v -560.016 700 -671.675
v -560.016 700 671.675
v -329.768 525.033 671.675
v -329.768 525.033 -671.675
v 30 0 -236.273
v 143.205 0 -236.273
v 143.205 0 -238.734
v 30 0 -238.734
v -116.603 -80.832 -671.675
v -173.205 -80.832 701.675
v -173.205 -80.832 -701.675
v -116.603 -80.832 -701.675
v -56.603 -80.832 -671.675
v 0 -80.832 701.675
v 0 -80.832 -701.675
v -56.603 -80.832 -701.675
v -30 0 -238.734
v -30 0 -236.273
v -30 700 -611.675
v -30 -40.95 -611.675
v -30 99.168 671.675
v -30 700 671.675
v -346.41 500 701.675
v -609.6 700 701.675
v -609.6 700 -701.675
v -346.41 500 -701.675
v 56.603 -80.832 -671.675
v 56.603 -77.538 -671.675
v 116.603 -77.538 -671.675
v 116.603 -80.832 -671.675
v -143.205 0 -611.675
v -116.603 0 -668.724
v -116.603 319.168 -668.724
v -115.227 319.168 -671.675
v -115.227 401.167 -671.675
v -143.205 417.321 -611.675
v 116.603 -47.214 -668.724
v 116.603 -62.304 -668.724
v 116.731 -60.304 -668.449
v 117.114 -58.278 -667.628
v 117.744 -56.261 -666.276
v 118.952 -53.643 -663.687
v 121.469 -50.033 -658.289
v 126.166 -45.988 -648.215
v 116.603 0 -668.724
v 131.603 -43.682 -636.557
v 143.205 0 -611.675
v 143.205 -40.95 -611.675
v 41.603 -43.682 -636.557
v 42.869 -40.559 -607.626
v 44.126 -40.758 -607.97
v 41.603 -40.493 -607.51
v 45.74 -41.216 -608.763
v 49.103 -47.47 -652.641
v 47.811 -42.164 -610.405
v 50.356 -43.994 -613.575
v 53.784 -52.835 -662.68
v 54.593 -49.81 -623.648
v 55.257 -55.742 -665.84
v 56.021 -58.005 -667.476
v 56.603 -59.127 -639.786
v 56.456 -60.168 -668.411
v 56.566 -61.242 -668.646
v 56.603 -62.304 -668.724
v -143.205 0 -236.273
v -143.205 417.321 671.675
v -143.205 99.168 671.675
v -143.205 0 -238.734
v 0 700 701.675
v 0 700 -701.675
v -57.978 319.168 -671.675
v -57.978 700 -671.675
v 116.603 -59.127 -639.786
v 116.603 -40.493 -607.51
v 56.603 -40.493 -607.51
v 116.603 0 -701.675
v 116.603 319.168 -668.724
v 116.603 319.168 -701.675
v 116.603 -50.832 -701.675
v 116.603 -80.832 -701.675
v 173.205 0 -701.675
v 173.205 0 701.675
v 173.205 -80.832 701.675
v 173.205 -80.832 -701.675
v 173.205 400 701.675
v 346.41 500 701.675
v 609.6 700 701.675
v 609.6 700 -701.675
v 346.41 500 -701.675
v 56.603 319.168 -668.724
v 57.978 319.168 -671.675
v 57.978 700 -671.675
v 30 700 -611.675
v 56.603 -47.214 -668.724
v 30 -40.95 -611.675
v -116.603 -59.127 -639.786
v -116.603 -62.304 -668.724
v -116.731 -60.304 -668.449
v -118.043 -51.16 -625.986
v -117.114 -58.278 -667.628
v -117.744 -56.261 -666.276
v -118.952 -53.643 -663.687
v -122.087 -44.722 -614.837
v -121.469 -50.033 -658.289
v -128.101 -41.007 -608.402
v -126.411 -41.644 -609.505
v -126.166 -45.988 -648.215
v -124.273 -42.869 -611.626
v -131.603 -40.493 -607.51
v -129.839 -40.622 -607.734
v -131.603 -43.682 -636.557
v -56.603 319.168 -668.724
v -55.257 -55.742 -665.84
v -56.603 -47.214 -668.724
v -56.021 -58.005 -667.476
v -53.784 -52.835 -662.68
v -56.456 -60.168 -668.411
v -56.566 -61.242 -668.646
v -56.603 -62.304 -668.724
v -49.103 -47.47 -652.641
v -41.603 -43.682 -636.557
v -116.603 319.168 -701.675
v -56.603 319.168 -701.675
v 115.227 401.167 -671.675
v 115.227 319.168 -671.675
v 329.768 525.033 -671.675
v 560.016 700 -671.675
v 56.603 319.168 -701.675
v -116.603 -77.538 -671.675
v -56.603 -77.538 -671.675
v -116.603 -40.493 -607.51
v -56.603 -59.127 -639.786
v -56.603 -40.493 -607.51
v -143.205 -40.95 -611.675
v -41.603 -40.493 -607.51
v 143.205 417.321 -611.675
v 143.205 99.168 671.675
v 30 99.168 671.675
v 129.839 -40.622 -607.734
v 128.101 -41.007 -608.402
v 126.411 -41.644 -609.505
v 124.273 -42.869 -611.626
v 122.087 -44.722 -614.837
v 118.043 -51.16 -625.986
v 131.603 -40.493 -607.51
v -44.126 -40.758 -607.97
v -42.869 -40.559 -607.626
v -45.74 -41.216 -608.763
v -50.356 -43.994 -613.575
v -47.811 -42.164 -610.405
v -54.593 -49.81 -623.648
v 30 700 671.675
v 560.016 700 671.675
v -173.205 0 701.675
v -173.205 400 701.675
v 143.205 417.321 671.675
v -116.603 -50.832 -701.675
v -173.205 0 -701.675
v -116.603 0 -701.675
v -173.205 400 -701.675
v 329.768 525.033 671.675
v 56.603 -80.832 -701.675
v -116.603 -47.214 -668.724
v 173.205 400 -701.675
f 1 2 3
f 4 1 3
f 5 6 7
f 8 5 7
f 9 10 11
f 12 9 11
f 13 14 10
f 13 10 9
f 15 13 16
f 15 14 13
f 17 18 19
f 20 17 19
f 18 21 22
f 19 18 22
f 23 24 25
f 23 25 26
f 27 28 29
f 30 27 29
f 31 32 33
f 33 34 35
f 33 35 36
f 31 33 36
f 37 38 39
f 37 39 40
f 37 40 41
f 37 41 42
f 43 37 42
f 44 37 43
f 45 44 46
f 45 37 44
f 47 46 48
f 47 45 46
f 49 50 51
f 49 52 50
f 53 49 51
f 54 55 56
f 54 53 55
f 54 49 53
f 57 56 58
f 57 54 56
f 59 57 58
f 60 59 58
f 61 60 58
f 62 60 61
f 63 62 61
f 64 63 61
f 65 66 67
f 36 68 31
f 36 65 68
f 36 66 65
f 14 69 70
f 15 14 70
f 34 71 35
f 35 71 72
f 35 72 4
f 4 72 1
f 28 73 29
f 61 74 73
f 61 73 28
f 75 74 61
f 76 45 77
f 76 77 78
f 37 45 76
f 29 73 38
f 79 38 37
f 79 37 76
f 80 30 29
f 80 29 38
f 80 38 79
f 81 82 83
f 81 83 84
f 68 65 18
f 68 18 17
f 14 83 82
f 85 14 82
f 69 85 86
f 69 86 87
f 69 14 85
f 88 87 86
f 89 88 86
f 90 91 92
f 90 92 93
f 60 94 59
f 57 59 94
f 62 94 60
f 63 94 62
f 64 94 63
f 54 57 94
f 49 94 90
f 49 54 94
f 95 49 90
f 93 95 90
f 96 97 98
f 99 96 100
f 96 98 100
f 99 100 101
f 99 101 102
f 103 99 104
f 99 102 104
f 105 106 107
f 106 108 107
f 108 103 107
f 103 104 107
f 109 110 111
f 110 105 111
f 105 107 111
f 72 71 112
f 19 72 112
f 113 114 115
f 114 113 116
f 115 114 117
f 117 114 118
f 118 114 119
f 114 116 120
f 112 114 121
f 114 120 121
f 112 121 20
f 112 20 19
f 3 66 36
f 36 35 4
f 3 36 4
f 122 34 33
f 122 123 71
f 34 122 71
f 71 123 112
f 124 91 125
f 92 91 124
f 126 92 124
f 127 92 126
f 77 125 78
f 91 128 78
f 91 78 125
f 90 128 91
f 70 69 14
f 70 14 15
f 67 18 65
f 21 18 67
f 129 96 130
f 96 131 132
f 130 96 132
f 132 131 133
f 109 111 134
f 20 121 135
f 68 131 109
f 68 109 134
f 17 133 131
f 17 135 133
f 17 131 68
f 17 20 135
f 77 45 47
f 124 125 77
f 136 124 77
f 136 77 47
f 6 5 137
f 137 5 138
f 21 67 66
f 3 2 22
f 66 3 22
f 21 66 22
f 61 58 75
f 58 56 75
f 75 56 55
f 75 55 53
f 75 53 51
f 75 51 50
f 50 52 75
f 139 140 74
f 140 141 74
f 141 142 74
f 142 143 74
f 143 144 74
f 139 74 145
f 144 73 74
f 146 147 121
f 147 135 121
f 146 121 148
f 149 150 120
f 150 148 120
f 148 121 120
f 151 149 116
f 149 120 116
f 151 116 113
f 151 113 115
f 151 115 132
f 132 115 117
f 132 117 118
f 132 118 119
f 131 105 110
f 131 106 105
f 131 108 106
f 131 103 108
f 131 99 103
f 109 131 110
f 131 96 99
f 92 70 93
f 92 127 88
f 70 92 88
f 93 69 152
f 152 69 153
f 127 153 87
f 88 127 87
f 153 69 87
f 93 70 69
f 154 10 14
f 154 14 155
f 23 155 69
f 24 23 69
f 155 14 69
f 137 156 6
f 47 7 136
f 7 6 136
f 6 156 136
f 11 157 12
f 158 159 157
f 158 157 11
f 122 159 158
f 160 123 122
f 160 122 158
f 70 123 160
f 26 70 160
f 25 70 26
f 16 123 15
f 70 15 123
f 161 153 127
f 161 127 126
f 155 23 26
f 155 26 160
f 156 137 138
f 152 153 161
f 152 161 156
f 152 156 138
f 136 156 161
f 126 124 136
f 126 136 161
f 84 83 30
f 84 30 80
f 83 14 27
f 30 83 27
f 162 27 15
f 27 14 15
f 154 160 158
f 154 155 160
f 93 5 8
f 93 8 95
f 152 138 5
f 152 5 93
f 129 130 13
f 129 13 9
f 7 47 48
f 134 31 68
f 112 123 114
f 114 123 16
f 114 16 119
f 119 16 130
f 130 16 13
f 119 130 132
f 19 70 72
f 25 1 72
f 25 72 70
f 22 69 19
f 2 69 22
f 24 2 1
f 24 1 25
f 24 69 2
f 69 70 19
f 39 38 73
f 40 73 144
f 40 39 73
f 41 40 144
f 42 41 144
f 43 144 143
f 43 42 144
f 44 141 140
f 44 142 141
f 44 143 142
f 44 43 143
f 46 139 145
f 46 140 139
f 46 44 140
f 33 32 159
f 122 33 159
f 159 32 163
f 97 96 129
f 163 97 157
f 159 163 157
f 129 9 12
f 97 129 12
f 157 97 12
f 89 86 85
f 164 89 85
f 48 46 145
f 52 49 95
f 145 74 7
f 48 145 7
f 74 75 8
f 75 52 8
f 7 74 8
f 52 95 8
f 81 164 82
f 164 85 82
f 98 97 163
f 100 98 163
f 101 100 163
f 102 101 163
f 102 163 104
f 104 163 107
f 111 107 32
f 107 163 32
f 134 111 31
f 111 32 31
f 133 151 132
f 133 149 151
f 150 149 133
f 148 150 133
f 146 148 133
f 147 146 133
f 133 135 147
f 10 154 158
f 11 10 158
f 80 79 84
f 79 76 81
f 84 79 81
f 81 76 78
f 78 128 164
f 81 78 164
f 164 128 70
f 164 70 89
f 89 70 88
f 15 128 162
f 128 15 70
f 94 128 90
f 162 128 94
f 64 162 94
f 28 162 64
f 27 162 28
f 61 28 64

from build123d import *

# Parameters (mm, degrees)
BOSS_EXTRUDE1_DEPTH = 701.675
SHELL1_T            = -30
SKETCH3_W           = 113.205080757
SKETCH3_H           = 1343.35
CUT_EXTRUDE1_DEPTH  = 1146.801014847
SKETCH4_W           = 1403.35
SKETCH4_H           = 80.832113544
BOSS_EXTRUDE2_DEPTH = 173.20508
BOSS_EXTRUDE3_REACH = 1150.165
SKETCH10_W          = 60
SKETCH10_H          = 400
CUT_EXTRUDE5_DEPTH  = 30
CUT_EXTRUDE6_DEPTH  = 113.205081
SKETCH12_W          = 26.602540378
SKETCH12_H          = 50.832113544
SKETCH12_W_2        = 26.602540379
BOSS_EXTRUDE4_DEPTH = 30
CHAMFER3_SIZE       = 30
CHAMFER3_SIZE2      = 64.550235712
CHAMFER4_SIZE       = 27.978459489
CHAMFER4_SIZE_2     = 60
FILLET2_R           = 15


with BuildPart() as part:
    # Sketch2 → Boss-Extrude1 (new, symmetric)
    with BuildSketch(Plane.XY):
        Polygon((0, 0), (0, 700), (-609.6, 700), (-346.410161514, 500), (-173.205080757, 400), (-173.205080757, 0), align=None)
    extrude(amount=BOSS_EXTRUDE1_DEPTH, both=True)

    # Shell1
    shell1_openings = [part.faces().sort_by_distance(p)[0] for p in [
        (-304.8, 700, 0),
    ]]
    offset(amount=SHELL1_T, openings=shell1_openings, kind=Kind.INTERSECTION)

    # Sketch3 → Cut-Extrude1 (cut, through all)
    with BuildSketch(Plane(origin=(0, 30, 0), x_dir=(1, 0, 0), z_dir=(0, 1, 0))):
        with Locations((-86.602540379, 0)):
            Rectangle(SKETCH3_W, SKETCH3_H)
    extrude(amount=-CUT_EXTRUDE1_DEPTH, mode=Mode.SUBTRACT)

    # Sketch4 → Boss-Extrude2 (add)
    with BuildSketch(Plane(origin=(0, 0, 0), x_dir=(0, 0, -1), z_dir=(1, 0, 0))):
        with Locations((0, -40.416056772)):
            Rectangle(SKETCH4_W, SKETCH4_H)
    extrude(amount=-BOSS_EXTRUDE2_DEPTH)

    # Sketch8 → Boss-Extrude3 (add, up to next)
    with BuildSketch(Plane.ZY.offset(30), mode=Mode.PRIVATE) as boss_extrude3_sk1:
        Polygon((671.675, -50.832113544), (-701.675, -50.832113544), (671.675, 99.167886456), align=None)
    boss_extrude3_tool1 = extrude(boss_extrude3_sk1.sketch, amount=BOSS_EXTRUDE3_REACH, mode=Mode.PRIVATE) - part.part
    add(boss_extrude3_tool1.solids().sort_by_distance((-30, -0.832114, 213.891667))[0])

    # Sketch10 → Cut-Extrude5 (cut)
    with BuildSketch(Plane(origin=(0, 0, -701.675), x_dir=(-1, 0, 0), z_dir=(0, 0, -1))):
        with Locations((86.602540378, 119.167886456)):
            Rectangle(SKETCH10_W, SKETCH10_H)
    extrude(amount=-CUT_EXTRUDE5_DEPTH, mode=Mode.SUBTRACT)

    # Sketch11 → Cut-Extrude6 (cut)
    with BuildSketch(Plane.ZY.offset(30)):
        Polygon((-238.734415101, 0), (-701.675, 0), (-701.675, -50.832113544), align=None)
    extrude(amount=CUT_EXTRUDE6_DEPTH, mode=Mode.SUBTRACT)

    # Sketch12 → Boss-Extrude4 (add)
    with BuildSketch(Plane(origin=(0, 0, -701.675), x_dir=(-1, 0, 0), z_dir=(0, 0, -1))):
        with Locations((43.301270189, -25.416056772)):
            Rectangle(SKETCH12_W, SKETCH12_H)
        with Locations((129.903810568, -25.416056772)):
            Rectangle(SKETCH12_W_2, SKETCH12_H)
    extrude(amount=-BOSS_EXTRUDE4_DEPTH)

    # Chamfer3
    chamfer3_edges = [part.edges().sort_by_distance(p)[0] for p in [
        (-86.602540378, -47.538033361, -671.675),
    ]]
    chamfer3_side = [part.faces().sort_by_distance(p)[0] for p in [
        (-86.602540378, -64.185073453, -671.675),
    ]]
    chamfer(chamfer3_edges, length=CHAMFER3_SIZE, length2=CHAMFER3_SIZE2, reference=chamfer3_side[0])

    # Chamfer4
    # the kernel refuses this chamfer: 60, 27.978459489 mm, written as the material it adds along each edge
    with BuildSketch(Plane(origin=(-30, -202.996561647, -671.675), x_dir=(-0.9971975577536775, 0, -0.07481330637059934), z_dir=(0, 1, 0))) as chamfer4_piece_1_section:
        Polygon((CHAMFER4_SIZE * 0.997197557764, CHAMFER4_SIZE * 0.0748133063714), (-CHAMFER4_SIZE_2 * 0.0748133063706, CHAMFER4_SIZE_2 * 0.997197557754), (0, 0), align=None)
    chamfer4_piece_1 = extrude(amount=902.996561647, mode=Mode.PRIVATE)
    chamfer4_piece_1 = split(chamfer4_piece_1, bisect_by=Plane(origin=(-56.602540378, 136.912183194, -651.689026628), z_dir=(1, 0, 0)), keep=Keep.TOP, mode=Mode.PRIVATE)
    chamfer4_piece_1 = split(chamfer4_piece_1, bisect_by=Plane(origin=(-39.296991829, -43.172308533, -631.915268116), z_dir=(0, 0.9940256554090712, -0.1091466737402779)), keep=Keep.TOP, mode=Mode.PRIVATE)
    add(chamfer4_piece_1)
    with BuildSketch(Plane(origin=(-30, -202.996561647, -671.675), x_dir=(-0.9971975577536775, 0, -0.07481330637059934), z_dir=(0, 1, 0))) as chamfer4_piece_2_section:
        Polygon((CHAMFER4_SIZE * 0.997197557764, CHAMFER4_SIZE * 0.0748133063714), (-CHAMFER4_SIZE_2 * 0.0748133063706, CHAMFER4_SIZE_2 * 0.997197557754), (0, 0), align=None)
    chamfer4_piece_2 = extrude(amount=902.996561647, mode=Mode.PRIVATE)
    chamfer4_piece_2 = split(chamfer4_piece_2, bisect_by=Plane(origin=(-57.061180082, 319.167886456, -670.691443982), z_dir=(0, 1, 0)), keep=Keep.TOP, mode=Mode.PRIVATE)
    add(chamfer4_piece_2)
    with BuildSketch(Plane(origin=(-143.205080757, 572.779036361, -671.675), x_dir=(0.9971975577536775, 0, -0.07481330637059934), z_dir=(0, -1, 0))) as chamfer4_piece_3_section:
        Polygon((CHAMFER4_SIZE * 0.997197557764, CHAMFER4_SIZE * 0.0748133063714), (-CHAMFER4_SIZE_2 * 0.0748133063706, CHAMFER4_SIZE_2 * 0.997197557754), (0, 0), align=None)
    chamfer4_piece_3 = extrude(amount=572.779036361, mode=Mode.PRIVATE)
    chamfer4_piece_3 = split(chamfer4_piece_3, bisect_by=Plane(origin=(-116.144636453, 319.167886456, -670.690655041), z_dir=(0, 1, 0)), keep=Keep.TOP, mode=Mode.PRIVATE)
    chamfer4_piece_3 = split(chamfer4_piece_3, bisect_by=Plane(origin=(-98.276526048, 391.38099492, -670.690655041), z_dir=(-0.4999999999999916, -0.8660254037844436, 0)), keep=Keep.TOP, mode=Mode.PRIVATE)
    add(chamfer4_piece_3)
    with BuildSketch(Plane(origin=(-143.205080757, 572.779036361, -671.675), x_dir=(0.9971975577536775, 0, -0.07481330637059934), z_dir=(0, -1, 0))) as chamfer4_piece_4_section:
        Polygon((CHAMFER4_SIZE * 0.997197557764, CHAMFER4_SIZE * 0.0748133063714), (-CHAMFER4_SIZE_2 * 0.0748133063706, CHAMFER4_SIZE_2 * 0.997197557754), (0, 0), align=None)
    chamfer4_piece_4 = extrude(amount=572.779036361, mode=Mode.PRIVATE)
    chamfer4_piece_4 = split(chamfer4_piece_4, bisect_by=Plane(origin=(-116.602540378, 159.583943228, -651.628898069), z_dir=(-1, 0, 0)), keep=Keep.TOP, mode=Mode.PRIVATE)
    chamfer4_piece_4 = split(chamfer4_piece_4, bisect_by=Plane(origin=(-24.639506088, 348.866641624, -651.628898069), z_dir=(-0.4999999999999916, -0.8660254037844436, 0)), keep=Keep.TOP, mode=Mode.PRIVATE)
    add(chamfer4_piece_4)
    with BuildSketch(Plane(origin=(-143.205080757, 0, -671.675), x_dir=(0.997197557763733, 0, -0.07481330623656689), z_dir=(0, -1, 0))) as chamfer4_piece_5_section:
        Polygon((CHAMFER4_SIZE * 0.997197557774, CHAMFER4_SIZE * 0.0748133062374), (-CHAMFER4_SIZE_2 * 0.0748133102771, CHAMFER4_SIZE_2 * 0.997197557461), (0, 0), align=None)
    chamfer4_piece_5 = extrude(amount=202.996561649, mode=Mode.PRIVATE)
    chamfer4_piece_5 = split(chamfer4_piece_5, bisect_by=Plane(origin=(-133.810698644, -45.119634059, -649.650041571), z_dir=(0, 0.9940256554090712, -0.1091466737402779)), keep=Keep.TOP, mode=Mode.PRIVATE)
    chamfer4_piece_5 = split(chamfer4_piece_5, bisect_by=Plane(origin=(-116.602540378, -22.694999754, -652.112326353), z_dir=(-1, 0, 0)), keep=Keep.TOP, mode=Mode.PRIVATE)
    add(chamfer4_piece_5)

    # Fillet2
    # the kernel refuses this fillet: 15 mm, written as the material it takes off along each edge
    with BuildSketch(Plane(origin=(-116.602540378, -51.307042391, -706.000294048), x_dir=(-1, 0, 0), z_dir=(0, 0.1091466737402779, 0.9940256554090712))) as fillet2_piece_1_section:
        with BuildLine():
            CenterArc((FILLET2_R, FILLET2_R), FILLET2_R, 180, 90)
            Line((0, FILLET2_R), (0, 0))
            Line((0, 0), (FILLET2_R, 0))
        make_face()
    fillet2_piece_1 = extrude(amount=136.581833424, mode=Mode.PRIVATE)
    fillet2_piece_1 = split(fillet2_piece_1, bisect_by=Plane(origin=(-128.893894845, -47.070973497, -642.365437483), z_dir=(0.9063077856304061, 0, 0.4226182647563991)), keep=Keep.TOP, mode=Mode.PRIVATE)
    fillet2_piece_1 = split(fillet2_piece_1, bisect_by=Plane(origin=(-119.802580373, -55.394163315, -633.320692004), z_dir=(0, 0.8660254037844397, -0.4999999999999981)), keep=Keep.TOP, mode=Mode.PRIVATE)
    add(fillet2_piece_1, mode=Mode.SUBTRACT)
    with BuildSketch(Plane(origin=(-56.602540378, -51.307042388, -706.000294023), x_dir=(1, 0, 0), z_dir=(0, 0.1091466737402779, 0.9940256554090712))) as fillet2_piece_2_section:
        with BuildLine():
            CenterArc((FILLET2_R, -FILLET2_R), FILLET2_R, 90, 90)
            Line((0, -FILLET2_R), (0, 0))
            Line((0, 0), (FILLET2_R, 0))
        make_face()
    fillet2_piece_2 = extrude(amount=136.581833399, mode=Mode.PRIVATE)
    fillet2_piece_2 = split(fillet2_piece_2, bisect_by=Plane(origin=(-44.311185982, -47.070973496, -642.36543738), z_dir=(-0.9063077870369262, 0, 0.42261826174010714)), keep=Keep.TOP, mode=Mode.PRIVATE)
    fillet2_piece_2 = split(fillet2_piece_2, bisect_by=Plane(origin=(-53.402500388, -55.394163299, -633.320691976), z_dir=(0, 0.8660254037844397, -0.4999999999999981)), keep=Keep.TOP, mode=Mode.PRIVATE)
    add(fillet2_piece_2, mode=Mode.SUBTRACT)


with BuildPart() as body_2:
    # Mirror2: mirrored copy
    add(part.part.mirror(Plane(origin=(0, 0, 701.675), x_dir=(0, 0, 1), z_dir=(-1, 0, 0))))


solid = Compound([part.part, body_2.part])
